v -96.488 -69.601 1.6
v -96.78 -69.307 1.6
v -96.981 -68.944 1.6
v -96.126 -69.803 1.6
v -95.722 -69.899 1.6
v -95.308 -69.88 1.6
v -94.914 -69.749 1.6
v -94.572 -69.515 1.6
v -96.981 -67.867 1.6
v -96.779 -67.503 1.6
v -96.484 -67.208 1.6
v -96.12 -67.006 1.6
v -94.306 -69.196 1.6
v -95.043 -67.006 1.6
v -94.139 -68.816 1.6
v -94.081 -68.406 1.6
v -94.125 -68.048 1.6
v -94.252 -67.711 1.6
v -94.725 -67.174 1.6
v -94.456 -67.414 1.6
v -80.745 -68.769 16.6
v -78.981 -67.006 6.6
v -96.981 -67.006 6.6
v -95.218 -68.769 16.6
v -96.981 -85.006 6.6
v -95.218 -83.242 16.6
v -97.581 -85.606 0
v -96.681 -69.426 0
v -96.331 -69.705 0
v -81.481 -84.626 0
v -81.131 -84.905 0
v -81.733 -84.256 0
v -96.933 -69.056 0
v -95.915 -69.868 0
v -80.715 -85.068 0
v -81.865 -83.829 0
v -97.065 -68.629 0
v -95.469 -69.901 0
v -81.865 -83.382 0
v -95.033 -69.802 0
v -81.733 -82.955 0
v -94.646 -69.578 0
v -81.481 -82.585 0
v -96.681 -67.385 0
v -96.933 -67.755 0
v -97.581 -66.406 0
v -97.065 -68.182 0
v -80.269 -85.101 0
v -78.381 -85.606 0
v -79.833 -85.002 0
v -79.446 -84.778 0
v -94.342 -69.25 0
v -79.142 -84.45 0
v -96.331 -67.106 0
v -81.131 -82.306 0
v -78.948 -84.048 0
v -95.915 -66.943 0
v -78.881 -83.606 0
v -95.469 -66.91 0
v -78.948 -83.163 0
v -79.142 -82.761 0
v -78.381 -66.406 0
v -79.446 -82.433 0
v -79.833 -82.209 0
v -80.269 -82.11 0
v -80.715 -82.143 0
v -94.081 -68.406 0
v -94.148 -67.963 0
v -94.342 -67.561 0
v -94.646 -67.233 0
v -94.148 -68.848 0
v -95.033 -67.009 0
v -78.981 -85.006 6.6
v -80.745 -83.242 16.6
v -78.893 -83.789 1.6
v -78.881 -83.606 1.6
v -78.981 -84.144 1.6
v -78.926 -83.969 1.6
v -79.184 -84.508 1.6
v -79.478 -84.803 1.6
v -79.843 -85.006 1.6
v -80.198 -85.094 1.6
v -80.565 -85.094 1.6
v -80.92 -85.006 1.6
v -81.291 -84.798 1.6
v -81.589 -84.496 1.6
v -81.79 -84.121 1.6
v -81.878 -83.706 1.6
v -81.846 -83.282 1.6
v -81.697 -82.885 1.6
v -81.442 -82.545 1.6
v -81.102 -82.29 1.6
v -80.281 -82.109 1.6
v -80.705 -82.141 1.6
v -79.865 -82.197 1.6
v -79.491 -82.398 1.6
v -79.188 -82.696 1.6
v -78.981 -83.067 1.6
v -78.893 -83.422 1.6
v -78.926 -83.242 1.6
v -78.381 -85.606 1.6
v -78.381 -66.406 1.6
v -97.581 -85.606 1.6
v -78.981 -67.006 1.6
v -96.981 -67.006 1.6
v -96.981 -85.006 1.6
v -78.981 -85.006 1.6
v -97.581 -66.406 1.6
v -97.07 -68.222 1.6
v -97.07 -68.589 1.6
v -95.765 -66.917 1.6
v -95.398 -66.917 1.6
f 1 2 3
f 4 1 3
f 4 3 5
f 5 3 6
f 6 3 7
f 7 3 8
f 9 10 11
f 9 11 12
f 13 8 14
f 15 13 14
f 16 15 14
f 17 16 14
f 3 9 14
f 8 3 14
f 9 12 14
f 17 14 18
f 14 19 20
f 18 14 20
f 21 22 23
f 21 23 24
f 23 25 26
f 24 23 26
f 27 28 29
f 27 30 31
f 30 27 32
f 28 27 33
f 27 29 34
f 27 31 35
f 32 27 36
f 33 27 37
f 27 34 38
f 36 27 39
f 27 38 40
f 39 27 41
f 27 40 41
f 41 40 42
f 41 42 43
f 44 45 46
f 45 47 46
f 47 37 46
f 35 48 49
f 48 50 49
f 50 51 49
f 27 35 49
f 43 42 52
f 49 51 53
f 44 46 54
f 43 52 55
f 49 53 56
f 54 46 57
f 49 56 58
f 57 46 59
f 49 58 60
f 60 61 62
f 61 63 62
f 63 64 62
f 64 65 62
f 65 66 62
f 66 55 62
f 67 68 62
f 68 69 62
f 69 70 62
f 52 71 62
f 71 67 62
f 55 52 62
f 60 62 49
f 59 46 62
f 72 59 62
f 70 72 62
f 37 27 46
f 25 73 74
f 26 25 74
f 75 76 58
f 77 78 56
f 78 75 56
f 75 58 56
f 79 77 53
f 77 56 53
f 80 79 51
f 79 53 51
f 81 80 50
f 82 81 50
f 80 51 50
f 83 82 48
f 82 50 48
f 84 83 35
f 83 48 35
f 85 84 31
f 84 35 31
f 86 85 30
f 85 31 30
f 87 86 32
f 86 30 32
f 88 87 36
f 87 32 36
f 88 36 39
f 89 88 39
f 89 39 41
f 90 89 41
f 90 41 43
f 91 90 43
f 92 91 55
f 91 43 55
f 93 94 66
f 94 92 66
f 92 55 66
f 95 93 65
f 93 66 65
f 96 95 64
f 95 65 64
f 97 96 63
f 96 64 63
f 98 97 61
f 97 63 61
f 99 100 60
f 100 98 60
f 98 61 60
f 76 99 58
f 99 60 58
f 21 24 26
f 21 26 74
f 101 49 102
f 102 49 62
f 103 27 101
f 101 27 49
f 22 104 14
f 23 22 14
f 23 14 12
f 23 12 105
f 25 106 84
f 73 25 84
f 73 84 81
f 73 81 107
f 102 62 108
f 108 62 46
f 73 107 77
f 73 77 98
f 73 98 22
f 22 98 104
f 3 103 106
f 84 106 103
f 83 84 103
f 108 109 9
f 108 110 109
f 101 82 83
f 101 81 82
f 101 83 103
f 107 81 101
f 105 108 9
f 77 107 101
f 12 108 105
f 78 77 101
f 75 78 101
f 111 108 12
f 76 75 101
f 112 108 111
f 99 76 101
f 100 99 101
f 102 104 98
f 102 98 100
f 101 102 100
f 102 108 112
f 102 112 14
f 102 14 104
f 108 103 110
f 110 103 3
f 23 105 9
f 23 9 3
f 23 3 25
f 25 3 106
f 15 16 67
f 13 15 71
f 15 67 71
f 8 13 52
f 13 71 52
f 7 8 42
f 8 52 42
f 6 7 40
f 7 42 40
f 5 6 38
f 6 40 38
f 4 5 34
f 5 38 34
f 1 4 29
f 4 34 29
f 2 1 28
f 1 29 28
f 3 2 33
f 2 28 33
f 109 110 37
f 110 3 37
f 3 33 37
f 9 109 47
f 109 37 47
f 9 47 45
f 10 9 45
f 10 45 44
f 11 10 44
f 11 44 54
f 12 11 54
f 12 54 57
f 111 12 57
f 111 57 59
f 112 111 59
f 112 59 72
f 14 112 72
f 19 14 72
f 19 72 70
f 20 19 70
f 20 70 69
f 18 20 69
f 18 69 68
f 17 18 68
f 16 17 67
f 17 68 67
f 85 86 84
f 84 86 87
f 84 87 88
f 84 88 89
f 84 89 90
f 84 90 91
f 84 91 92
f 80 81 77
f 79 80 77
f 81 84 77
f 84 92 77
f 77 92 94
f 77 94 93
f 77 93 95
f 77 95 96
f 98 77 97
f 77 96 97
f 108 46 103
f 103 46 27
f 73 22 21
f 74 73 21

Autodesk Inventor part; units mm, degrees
ref_plane "YZ Plane" through (0, 0, 0) normal (1, 0, 0) x (0, 1, 0)
ref_plane "XZ Plane" through (0, 0, 0) normal (0, 1, 0) x (-1, 0, 0)
ref_plane "XY Plane" through (0, 0, 0) normal (0, 0, 1) x (1, 0, 0)
sketch "스케치1" plane through (0, 0, 0) normal (0, 0, 1) x (1, 0, 0)
  circle A0 centre (-80.3814, -83.6055) radius 3 projected
  circle A1 centre (-80.3814, -83.6055) radius 1.5 projected
  circle A2 centre (-95.5814, -68.4055) radius 3 projected
  circle A3 centre (-95.5814, -68.4055) radius 1.5 projected
  line L0 (-78.3814, -66.4055) -> (-97.5814, -66.4055)
  line L1 (-97.5814, -66.4055) -> (-97.5814, -85.6055)
  line L2 (-97.5814, -85.6055) -> (-78.3814, -85.6055)
  line L3 (-78.3814, -85.6055) -> (-78.3814, -66.4055)
  point P0 (0, 0)
  dimension "d0" = 19.2
  dimension "d1" = 19.2
  dimension "d2" = 2
  dimension "d3" = 2
extrude "돌출1" add sketch "스케치1" along normal blind 1.6 contours L3 L2 A0 | A0 L2 L1 A2 L0 L3 | A2 L1 L0 picked at (-80.5204, -85.4352) picked at (-95.563, -66.5758)
sketch "스케치2" plane through (0, 0, 1.6) normal (0, 0, 1) x (1, 0, 0)
  line L0 (-78.9814, -67.0055) -> (-96.9814, -67.0055)
  line L1 (-96.9814, -67.0055) -> (-96.9814, -85.0055)
  line L2 (-96.9814, -85.0055) -> (-78.9814, -85.0055)
  line L3 (-78.9814, -85.0055) -> (-78.9814, -67.0055)
  line L4 (-97.5814, -85.6055) -> (-78.3814, -85.6055) projected
  line L5 (-78.3814, -85.6055) -> (-78.3814, -66.4055) projected
  line L6 (-78.3814, -66.4055) -> (-97.5814, -66.4055) projected
  line L7 (-97.5814, -66.4055) -> (-97.5814, -85.6055) projected
  circle A0 centre (-80.3814, -83.6055) radius 1.5 projected
  circle A1 centre (-95.5814, -68.4055) radius 1.5 projected
  point P0 (0, 0)
  dimension "d6" = 18
  dimension "d7" = 18
  dimension "d8" = 19.2
  dimension "d9" = 0.6
  dimension "d10" = 0.6
extrude "돌출2" add sketch "스케치2" along normal blind 5 contours L3 A0 L2 L1 A1 L0 | A1 L1 L0 | L3 A0 L2 | A1 L1 L0 | L3 L2 A0
sketch "스케치3" plane through (0, 0, 6.6) normal (0, 0, 1) x (1, 0, 0)
  line L0 (-96.9814, -85.0055) -> (-78.9814, -85.0055) projected
  line L1 (-78.9814, -85.0055) -> (-78.9814, -67.0055) projected
  line L2 (-78.9814, -67.0055) -> (-96.9814, -67.0055) projected
  line L3 (-96.9814, -67.0055) -> (-96.9814, -85.0055) projected
  point P0 (0, 0)
extrude "돌출3" add sketch "스케치3" along normal blind 10 draft -10
properties part number "KeySwitch"
